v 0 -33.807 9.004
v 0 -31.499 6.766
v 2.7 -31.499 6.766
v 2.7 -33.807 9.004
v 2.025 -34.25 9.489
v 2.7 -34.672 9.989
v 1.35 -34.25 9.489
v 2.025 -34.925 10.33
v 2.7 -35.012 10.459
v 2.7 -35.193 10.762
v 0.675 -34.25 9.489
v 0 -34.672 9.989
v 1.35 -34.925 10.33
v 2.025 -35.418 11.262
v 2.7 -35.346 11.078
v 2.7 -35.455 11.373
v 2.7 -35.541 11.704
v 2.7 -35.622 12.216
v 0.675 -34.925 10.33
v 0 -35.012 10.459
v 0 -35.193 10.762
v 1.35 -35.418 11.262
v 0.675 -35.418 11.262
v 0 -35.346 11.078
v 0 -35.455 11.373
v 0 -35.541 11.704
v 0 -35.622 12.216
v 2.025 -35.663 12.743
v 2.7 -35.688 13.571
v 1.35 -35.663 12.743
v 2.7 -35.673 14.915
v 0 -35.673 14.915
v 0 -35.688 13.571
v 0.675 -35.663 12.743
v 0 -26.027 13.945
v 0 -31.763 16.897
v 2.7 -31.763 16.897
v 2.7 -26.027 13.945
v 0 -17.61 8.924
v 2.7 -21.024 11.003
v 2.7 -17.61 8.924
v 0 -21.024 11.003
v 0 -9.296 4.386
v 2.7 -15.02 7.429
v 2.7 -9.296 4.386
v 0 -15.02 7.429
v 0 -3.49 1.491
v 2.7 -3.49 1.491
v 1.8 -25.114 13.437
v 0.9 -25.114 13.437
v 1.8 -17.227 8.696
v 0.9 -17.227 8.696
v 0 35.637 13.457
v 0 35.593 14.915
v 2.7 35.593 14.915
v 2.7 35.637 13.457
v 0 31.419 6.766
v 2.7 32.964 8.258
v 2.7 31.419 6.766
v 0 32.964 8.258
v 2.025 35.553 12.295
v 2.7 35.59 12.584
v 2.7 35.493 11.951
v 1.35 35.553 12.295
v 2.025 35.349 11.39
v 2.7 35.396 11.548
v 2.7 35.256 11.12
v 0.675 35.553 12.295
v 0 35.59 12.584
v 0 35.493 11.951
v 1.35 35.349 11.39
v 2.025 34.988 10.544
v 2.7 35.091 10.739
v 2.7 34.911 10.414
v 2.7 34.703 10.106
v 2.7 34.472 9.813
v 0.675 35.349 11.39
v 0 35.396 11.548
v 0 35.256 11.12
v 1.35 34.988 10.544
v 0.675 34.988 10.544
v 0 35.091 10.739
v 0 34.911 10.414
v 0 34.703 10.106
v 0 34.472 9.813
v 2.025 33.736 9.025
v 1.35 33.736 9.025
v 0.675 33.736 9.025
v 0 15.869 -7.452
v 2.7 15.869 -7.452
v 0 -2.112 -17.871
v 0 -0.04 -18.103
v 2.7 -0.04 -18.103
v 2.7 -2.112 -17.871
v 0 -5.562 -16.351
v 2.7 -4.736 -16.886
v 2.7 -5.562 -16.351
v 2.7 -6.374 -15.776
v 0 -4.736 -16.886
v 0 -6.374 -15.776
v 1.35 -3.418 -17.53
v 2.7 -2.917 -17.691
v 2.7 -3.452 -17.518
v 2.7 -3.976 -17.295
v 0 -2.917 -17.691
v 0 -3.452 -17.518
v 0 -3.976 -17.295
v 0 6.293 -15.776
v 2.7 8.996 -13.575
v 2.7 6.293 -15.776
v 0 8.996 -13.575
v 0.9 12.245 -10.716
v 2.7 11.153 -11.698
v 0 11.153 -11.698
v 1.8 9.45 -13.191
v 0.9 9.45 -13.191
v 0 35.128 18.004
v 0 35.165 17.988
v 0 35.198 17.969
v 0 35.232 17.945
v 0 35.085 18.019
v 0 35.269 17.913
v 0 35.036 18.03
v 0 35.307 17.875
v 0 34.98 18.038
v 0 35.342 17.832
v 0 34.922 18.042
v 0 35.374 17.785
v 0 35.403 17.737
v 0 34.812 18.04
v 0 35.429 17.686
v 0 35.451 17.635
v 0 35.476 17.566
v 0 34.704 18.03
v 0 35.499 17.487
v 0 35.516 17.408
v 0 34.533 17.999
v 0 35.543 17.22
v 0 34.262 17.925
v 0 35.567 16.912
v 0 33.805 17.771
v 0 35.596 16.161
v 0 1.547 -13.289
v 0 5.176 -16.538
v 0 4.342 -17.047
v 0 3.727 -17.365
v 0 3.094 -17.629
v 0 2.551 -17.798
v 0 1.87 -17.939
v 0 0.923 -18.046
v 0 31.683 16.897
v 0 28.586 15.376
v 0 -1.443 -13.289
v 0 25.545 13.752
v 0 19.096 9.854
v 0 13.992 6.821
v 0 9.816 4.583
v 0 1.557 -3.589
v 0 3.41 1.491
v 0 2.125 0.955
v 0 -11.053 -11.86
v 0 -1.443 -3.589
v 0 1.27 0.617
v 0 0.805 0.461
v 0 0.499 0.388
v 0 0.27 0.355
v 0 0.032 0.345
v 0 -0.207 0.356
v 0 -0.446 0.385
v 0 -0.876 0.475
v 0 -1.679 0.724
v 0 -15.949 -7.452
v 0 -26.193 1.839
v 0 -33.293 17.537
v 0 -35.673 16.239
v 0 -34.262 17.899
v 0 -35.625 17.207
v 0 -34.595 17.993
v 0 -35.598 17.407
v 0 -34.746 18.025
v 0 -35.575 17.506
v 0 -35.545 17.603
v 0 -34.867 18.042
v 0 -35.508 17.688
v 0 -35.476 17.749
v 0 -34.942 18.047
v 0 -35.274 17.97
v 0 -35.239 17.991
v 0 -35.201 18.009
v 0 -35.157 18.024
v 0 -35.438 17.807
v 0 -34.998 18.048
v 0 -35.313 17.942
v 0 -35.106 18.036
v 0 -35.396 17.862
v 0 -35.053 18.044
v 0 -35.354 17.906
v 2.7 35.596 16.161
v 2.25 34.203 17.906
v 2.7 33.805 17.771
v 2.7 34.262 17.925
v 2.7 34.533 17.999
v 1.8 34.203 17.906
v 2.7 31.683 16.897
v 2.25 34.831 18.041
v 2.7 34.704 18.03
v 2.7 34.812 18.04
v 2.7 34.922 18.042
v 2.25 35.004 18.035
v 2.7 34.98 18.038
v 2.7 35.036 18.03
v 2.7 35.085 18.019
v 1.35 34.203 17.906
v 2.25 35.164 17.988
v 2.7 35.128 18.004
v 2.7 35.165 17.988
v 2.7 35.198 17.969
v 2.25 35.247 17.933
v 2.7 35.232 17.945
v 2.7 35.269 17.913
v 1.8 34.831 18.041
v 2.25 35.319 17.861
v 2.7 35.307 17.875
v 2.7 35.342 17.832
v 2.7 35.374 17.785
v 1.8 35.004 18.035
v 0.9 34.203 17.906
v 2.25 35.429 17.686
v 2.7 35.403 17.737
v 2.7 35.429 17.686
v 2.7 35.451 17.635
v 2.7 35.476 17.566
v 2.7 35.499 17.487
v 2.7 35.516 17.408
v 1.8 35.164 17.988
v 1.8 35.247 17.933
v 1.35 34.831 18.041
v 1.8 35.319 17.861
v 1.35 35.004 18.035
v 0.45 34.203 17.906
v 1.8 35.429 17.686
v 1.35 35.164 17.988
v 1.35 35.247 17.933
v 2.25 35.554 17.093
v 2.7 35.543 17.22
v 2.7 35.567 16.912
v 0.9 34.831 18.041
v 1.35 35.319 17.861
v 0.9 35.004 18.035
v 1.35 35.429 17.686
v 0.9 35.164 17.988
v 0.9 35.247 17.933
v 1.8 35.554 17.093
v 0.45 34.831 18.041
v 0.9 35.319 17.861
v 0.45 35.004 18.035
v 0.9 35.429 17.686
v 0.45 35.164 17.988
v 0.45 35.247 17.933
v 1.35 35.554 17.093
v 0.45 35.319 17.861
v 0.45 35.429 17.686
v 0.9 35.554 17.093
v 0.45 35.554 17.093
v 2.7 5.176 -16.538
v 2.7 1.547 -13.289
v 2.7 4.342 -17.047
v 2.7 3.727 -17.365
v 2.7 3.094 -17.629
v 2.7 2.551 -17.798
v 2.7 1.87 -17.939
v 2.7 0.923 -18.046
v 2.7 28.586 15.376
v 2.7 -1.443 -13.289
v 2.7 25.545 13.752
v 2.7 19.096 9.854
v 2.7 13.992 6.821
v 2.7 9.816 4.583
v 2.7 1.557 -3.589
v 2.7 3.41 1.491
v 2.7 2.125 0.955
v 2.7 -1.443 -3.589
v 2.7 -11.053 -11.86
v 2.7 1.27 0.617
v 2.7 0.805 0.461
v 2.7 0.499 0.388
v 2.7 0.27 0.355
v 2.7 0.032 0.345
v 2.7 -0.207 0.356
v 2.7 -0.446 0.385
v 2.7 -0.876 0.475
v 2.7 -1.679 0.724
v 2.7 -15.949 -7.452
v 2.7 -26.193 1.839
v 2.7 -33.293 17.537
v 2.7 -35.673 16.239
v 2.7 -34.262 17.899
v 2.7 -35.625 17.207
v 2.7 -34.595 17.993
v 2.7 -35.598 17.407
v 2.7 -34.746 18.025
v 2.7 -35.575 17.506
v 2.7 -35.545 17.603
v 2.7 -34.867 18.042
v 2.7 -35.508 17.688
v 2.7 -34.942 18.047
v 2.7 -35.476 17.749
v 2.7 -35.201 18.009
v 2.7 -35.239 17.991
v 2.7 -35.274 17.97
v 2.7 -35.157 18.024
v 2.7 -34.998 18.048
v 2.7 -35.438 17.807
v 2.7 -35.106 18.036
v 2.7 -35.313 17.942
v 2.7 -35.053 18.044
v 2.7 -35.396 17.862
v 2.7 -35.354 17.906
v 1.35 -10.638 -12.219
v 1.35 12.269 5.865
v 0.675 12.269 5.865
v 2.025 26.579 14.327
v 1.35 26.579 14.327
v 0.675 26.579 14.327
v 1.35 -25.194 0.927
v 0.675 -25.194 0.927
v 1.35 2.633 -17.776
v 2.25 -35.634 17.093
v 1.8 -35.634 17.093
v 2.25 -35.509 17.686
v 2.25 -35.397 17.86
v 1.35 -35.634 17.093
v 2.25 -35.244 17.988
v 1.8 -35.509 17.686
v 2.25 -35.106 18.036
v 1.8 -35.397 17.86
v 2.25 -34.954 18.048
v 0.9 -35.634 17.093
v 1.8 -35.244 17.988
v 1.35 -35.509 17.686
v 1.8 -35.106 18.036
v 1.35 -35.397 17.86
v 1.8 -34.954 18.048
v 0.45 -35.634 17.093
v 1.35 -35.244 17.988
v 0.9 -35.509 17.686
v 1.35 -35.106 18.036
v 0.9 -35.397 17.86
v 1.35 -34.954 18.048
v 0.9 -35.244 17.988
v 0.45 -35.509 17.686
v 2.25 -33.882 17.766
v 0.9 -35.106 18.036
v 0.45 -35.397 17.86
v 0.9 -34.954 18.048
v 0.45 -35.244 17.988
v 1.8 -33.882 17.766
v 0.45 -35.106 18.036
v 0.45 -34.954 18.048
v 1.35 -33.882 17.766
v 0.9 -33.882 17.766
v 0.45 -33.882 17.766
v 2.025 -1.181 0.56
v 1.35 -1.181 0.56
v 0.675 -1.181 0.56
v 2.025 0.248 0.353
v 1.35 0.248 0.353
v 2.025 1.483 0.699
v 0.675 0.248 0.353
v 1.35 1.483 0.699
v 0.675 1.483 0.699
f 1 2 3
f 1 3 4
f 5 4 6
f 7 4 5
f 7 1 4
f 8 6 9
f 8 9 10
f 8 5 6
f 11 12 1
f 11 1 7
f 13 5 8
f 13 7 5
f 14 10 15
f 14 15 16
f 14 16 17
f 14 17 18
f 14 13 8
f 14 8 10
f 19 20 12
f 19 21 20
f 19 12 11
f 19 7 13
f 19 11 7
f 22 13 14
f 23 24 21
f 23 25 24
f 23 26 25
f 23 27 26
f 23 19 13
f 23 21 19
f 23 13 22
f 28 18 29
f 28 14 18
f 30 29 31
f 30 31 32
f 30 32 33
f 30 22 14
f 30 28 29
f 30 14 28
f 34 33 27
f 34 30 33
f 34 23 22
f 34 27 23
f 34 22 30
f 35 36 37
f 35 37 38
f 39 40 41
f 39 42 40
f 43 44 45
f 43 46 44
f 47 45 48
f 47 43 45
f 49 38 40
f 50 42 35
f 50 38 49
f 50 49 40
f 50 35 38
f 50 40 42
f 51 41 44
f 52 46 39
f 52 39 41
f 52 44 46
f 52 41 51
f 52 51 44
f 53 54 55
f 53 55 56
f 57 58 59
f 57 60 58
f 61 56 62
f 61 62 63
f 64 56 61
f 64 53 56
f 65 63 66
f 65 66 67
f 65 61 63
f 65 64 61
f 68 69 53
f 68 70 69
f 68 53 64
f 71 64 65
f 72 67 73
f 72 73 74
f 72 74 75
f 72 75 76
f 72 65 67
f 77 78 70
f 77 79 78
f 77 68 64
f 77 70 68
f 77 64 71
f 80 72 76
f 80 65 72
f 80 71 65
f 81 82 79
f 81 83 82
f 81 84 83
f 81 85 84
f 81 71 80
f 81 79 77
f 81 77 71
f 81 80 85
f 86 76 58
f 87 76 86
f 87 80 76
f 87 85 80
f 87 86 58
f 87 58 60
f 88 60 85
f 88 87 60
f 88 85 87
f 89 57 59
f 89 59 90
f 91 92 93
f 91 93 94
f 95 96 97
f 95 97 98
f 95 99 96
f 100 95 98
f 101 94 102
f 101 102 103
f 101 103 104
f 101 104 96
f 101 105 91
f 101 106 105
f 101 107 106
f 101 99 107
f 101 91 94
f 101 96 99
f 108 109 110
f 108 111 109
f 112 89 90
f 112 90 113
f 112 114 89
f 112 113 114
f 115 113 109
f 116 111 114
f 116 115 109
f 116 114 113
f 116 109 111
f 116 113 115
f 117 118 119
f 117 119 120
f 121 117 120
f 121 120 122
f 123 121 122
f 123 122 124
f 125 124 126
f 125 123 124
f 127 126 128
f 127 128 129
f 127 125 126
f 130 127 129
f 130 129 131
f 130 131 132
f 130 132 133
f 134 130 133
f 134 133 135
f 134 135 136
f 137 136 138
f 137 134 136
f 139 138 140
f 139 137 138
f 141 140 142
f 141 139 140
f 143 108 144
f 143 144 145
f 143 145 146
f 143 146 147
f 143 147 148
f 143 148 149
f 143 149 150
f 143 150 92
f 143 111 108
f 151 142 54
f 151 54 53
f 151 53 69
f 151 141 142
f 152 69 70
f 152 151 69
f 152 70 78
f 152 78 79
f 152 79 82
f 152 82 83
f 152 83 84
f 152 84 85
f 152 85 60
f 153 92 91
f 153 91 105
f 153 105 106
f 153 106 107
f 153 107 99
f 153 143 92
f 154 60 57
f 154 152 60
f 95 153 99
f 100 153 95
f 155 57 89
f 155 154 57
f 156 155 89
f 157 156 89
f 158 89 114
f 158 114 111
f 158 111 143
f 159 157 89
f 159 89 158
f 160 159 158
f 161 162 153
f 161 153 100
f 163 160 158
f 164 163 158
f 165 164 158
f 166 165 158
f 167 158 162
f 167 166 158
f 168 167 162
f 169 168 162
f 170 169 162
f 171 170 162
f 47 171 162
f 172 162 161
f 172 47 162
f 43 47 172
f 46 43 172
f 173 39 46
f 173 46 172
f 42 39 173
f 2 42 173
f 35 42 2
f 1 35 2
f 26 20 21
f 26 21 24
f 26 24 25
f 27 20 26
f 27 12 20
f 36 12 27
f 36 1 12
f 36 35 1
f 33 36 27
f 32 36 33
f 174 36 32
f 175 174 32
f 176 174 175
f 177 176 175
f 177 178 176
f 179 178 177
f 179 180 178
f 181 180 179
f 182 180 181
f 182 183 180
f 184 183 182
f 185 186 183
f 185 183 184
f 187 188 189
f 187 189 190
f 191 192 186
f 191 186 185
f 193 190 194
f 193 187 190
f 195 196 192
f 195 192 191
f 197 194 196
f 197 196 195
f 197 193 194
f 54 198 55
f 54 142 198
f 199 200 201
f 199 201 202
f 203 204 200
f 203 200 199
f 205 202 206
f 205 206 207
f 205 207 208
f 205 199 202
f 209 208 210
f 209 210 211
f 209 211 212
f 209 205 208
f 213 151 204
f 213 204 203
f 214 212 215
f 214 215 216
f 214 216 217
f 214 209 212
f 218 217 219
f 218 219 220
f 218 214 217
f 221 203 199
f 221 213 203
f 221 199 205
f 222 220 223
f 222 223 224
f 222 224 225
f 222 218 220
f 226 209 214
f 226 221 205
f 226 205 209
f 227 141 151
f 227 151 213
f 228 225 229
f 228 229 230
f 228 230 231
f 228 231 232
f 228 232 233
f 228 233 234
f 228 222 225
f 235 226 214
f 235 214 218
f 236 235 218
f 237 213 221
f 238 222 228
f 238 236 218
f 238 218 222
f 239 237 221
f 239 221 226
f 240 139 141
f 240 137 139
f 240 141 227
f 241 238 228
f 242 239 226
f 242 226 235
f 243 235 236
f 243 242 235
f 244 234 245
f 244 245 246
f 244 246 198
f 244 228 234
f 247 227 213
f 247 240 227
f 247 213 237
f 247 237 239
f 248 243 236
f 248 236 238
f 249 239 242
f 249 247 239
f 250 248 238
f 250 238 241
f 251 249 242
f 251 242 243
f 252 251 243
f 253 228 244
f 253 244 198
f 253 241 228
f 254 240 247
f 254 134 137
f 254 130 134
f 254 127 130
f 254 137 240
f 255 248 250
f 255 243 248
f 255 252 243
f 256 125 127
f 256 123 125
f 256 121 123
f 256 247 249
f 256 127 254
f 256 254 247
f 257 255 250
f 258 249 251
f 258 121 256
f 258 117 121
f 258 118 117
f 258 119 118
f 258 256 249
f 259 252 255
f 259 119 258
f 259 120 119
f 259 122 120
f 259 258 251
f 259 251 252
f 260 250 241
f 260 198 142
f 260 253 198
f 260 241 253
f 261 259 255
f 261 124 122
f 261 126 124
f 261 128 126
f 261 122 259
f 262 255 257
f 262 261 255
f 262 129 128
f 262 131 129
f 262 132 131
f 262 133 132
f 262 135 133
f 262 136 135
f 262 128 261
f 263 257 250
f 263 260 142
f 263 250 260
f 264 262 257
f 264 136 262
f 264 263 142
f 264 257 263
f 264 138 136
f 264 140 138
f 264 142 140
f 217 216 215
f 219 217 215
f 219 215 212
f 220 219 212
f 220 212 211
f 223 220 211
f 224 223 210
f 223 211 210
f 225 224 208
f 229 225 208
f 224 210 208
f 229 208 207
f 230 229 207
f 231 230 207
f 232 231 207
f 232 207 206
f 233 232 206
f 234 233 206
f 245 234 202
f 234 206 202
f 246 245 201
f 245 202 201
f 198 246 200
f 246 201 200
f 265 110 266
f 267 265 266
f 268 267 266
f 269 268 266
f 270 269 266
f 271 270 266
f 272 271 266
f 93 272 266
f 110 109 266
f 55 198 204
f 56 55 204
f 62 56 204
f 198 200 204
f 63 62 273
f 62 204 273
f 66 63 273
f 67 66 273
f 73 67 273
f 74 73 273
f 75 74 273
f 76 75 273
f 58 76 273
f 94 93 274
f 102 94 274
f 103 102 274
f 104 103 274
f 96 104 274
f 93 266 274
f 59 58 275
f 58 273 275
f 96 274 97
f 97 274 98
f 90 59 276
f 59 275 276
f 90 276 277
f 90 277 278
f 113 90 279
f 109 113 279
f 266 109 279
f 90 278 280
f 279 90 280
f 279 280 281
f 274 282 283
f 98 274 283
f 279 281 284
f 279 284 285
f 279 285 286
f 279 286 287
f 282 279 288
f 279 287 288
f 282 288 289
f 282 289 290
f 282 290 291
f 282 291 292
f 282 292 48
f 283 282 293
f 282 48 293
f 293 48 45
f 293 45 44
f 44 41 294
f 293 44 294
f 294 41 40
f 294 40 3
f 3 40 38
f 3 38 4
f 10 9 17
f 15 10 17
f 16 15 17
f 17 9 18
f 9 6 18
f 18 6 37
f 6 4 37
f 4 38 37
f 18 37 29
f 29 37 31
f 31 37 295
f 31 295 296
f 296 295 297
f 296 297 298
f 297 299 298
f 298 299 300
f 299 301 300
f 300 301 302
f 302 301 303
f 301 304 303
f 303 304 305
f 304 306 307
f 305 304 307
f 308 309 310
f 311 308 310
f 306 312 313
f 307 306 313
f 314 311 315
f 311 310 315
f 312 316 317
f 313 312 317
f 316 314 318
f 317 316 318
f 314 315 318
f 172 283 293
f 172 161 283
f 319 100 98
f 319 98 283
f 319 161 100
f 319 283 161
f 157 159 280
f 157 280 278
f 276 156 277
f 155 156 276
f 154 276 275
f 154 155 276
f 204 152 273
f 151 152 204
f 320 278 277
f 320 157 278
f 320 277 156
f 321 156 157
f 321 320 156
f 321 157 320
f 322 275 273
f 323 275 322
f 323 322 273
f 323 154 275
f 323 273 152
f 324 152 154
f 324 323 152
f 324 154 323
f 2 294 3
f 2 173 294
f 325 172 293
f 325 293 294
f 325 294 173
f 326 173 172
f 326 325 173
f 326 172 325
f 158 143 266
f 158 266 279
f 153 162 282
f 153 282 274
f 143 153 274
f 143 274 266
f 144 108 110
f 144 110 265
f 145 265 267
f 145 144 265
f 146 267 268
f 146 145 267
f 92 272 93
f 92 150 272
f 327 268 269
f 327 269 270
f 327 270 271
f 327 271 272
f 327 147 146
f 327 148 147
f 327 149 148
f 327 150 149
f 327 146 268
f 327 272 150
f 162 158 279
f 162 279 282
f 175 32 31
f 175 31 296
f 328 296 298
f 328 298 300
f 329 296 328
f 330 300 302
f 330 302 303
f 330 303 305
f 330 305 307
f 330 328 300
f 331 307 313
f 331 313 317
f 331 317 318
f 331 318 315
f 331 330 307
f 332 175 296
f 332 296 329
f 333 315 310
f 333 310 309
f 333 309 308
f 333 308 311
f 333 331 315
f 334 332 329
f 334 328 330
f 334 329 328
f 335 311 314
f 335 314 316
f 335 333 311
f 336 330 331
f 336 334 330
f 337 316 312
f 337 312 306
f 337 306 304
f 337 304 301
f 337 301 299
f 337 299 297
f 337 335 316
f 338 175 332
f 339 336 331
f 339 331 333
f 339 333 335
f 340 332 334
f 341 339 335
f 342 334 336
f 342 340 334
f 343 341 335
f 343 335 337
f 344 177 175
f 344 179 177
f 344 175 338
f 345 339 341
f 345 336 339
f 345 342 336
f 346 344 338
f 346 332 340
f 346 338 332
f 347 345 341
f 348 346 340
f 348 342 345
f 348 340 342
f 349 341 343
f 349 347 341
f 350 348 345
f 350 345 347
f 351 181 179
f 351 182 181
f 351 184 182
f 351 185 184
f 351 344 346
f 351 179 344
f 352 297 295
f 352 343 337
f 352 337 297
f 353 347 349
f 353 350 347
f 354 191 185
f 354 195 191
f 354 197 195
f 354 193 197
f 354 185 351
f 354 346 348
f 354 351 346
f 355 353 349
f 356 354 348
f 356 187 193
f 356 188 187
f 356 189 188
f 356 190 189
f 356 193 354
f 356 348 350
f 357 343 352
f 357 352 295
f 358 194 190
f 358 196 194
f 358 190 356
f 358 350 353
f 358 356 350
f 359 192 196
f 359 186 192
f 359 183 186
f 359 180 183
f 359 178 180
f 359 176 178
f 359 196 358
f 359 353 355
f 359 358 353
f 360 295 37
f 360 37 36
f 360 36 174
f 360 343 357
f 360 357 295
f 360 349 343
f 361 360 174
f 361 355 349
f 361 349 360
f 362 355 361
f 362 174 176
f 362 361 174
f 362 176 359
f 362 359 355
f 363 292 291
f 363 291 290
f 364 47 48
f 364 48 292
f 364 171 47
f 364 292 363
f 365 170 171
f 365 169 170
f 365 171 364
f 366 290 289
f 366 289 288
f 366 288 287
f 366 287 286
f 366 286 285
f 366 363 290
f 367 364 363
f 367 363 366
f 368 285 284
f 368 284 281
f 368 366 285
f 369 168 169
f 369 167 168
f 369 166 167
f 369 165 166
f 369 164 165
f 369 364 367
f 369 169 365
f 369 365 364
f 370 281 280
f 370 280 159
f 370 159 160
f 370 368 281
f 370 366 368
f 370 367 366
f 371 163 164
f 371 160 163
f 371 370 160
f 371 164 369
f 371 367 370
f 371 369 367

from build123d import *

# Parameters (mm, degrees)
SALIENTE_EXTRUIR1_DEPTH = 2.7


with BuildPart() as part:
    # Croquis1 → Saliente-Extruir1 (new body)
    with BuildSketch(Plane.YZ):
        with BuildLine():
            add(Edge.make_bspline(
                [(6.293439228, -15.775522485), (5.121962142, -16.593632507), (3.194137839, -17.939943421), (0.871254985, -18.056856227), (-0.040086355, -18.102724865)],
                knots=[0, 0, 0, 0, 0.607667972, 1, 1, 1, 1], degree=3))
            add(Edge.make_bspline(
                [(-0.040086355, -18.102724865), (-1.201974654, -18.009829097), (-3.52960923, -17.823729331), (-5.424560604, -16.459011542), (-6.373545472, -15.775522485)],
                knots=[0, 0, 0, 0, 0.499171871, 1, 1, 1, 1], degree=3))
            add(Edge.make_bspline(
                [(-6.373545472, -15.775522485), (-7.804862353, -14.601238141), (-11.07558572, -11.917863625), (-14.194675958, -9.059264094), (-15.948801542, -7.451629963)],
                knots=[0, 0, 0, 0, 0.437614778, 1, 1, 1, 1], degree=3))
            add(Edge.make_bspline(
                [(-15.948801542, -7.451629963), (-17.443388463, -6.10218116), (-20.530431809, -3.314918078), (-24.770274629, 0.536312591), (-28.467294634, 3.917288838), (-30.554741006, 5.878609194), (-31.49891708, 6.765750406)],
                knots=[0, 0, 0, 0, 0.286704657, 0.592183493, 0.815537105, 1, 1, 1, 1], degree=3))
            add(Edge.make_bspline(
                [(-31.49891708, 6.765750406), (-32.438822541, 7.635466475), (-33.894427025, 8.982370671), (-35.507559417, 11.007833432), (-35.713078645, 12.975472223), (-35.687723833, 14.194321553), (-35.672718902, 14.914892037)],
                knots=[0, 0, 0, 0, 0.40036792, 0.620038252, 0.775370742, 1, 1, 1, 1], degree=3))
            add(Edge.make_bspline(
                [(-35.672718902, 14.914892037), (-35.680689094, 15.639451674), (-35.690874791, 16.565419984), (-35.586054884, 17.634008996), (-35.221194824, 18.102724865), (-34.550677182, 18.007362541), (-33.425998925, 17.608351417), (-32.472200247, 17.20046624), (-31.763213091, 16.897275135)],
                knots=[0, 0, 0, 0, 0.316944263, 0.405046498, 0.463446105, 0.551890516, 0.666909176, 1, 1, 1, 1], degree=3))
            add(Edge.make_bspline(
                [(-31.763213091, 16.897275135), (-29.525822617, 15.781269732), (-24.541657724, 13.295179343), (-15.527263963, 7.429291582), (-8.131966695, 3.780675765), (-3.490287323, 1.490633478)],
                knots=[0, 0, 0, 0, 0.232717522, 0.518417556, 1, 1, 1, 1], degree=3))
            add(Edge.make_bspline(
                [(-3.490287323, 1.490633478), (-2.739069016, 1.146742809), (-1.552350155, 0.603489886), (0.206643558, 0.218203753), (1.746992984, 0.788773893), (2.774249384, 1.222278318), (3.41018108, 1.490633478)],
                knots=[0, 0, 0, 0, 0.341130867, 0.538893194, 0.714557953, 1, 1, 1, 1], degree=3))
            add(Edge.make_bspline(
                [(3.41018108, 1.490633478), (6.392233349, 2.895112996), (12.310419911, 5.682445699), (19.846239343, 10.308731434), (26.181207451, 14.233722821), (29.967258265, 16.066658656), (31.682979537, 16.897275135)],
                knots=[0, 0, 0, 0, 0.306659051, 0.608596131, 0.822630723, 1, 1, 1, 1], degree=3))
            add(Edge.make_bspline(
                [(31.682979537, 16.897275135), (32.513328743, 17.263685023), (33.540008962, 17.716730297), (34.719454724, 18.063183238), (35.207348957, 18.027712416), (35.503576328, 17.632491508), (35.613512678, 16.567275152), (35.60175886, 15.640265975), (35.592564917, 14.914892037)],
                knots=[0, 0, 0, 0, 0.394572904, 0.487867264, 0.536933985, 0.595286244, 0.683316176, 1, 1, 1, 1], degree=3))
            add(Edge.make_bspline(
                [(35.592564917, 14.914892037), (35.63716636, 14.039760306), (35.713078645, 12.550273754), (35.099962352, 10.424635865), (33.440384597, 8.704076796), (32.193829883, 7.508885437), (31.41875862, 6.765750406)],
                knots=[0, 0, 0, 0, 0.271148289, 0.461498213, 0.665175338, 1, 1, 1, 1], degree=3))
            Line((31.41875862, 6.765750406), (15.868633502, -7.451629963))
            add(Edge.make_bspline(
                [(15.868633502, -7.451629963), (14.660790378, -8.539574174), (12.528375778, -10.460262806), (9.386512886, -13.29436609), (7.354529376, -14.924349411), (6.293439228, -15.775522485)],
                knots=[0, 0, 0, 0, 0.38432297, 0.678495048, 1, 1, 1, 1], degree=3))
        make_face()
        Polygon((1.556751969, -3.588558087), (-1.443248031, -3.588553212), (-1.443248031, -13.288553212), (1.547027392, -13.288553212), align=None, mode=Mode.SUBTRACT)
    extrude(amount=SALIENTE_EXTRUIR1_DEPTH)


solid = part.part
